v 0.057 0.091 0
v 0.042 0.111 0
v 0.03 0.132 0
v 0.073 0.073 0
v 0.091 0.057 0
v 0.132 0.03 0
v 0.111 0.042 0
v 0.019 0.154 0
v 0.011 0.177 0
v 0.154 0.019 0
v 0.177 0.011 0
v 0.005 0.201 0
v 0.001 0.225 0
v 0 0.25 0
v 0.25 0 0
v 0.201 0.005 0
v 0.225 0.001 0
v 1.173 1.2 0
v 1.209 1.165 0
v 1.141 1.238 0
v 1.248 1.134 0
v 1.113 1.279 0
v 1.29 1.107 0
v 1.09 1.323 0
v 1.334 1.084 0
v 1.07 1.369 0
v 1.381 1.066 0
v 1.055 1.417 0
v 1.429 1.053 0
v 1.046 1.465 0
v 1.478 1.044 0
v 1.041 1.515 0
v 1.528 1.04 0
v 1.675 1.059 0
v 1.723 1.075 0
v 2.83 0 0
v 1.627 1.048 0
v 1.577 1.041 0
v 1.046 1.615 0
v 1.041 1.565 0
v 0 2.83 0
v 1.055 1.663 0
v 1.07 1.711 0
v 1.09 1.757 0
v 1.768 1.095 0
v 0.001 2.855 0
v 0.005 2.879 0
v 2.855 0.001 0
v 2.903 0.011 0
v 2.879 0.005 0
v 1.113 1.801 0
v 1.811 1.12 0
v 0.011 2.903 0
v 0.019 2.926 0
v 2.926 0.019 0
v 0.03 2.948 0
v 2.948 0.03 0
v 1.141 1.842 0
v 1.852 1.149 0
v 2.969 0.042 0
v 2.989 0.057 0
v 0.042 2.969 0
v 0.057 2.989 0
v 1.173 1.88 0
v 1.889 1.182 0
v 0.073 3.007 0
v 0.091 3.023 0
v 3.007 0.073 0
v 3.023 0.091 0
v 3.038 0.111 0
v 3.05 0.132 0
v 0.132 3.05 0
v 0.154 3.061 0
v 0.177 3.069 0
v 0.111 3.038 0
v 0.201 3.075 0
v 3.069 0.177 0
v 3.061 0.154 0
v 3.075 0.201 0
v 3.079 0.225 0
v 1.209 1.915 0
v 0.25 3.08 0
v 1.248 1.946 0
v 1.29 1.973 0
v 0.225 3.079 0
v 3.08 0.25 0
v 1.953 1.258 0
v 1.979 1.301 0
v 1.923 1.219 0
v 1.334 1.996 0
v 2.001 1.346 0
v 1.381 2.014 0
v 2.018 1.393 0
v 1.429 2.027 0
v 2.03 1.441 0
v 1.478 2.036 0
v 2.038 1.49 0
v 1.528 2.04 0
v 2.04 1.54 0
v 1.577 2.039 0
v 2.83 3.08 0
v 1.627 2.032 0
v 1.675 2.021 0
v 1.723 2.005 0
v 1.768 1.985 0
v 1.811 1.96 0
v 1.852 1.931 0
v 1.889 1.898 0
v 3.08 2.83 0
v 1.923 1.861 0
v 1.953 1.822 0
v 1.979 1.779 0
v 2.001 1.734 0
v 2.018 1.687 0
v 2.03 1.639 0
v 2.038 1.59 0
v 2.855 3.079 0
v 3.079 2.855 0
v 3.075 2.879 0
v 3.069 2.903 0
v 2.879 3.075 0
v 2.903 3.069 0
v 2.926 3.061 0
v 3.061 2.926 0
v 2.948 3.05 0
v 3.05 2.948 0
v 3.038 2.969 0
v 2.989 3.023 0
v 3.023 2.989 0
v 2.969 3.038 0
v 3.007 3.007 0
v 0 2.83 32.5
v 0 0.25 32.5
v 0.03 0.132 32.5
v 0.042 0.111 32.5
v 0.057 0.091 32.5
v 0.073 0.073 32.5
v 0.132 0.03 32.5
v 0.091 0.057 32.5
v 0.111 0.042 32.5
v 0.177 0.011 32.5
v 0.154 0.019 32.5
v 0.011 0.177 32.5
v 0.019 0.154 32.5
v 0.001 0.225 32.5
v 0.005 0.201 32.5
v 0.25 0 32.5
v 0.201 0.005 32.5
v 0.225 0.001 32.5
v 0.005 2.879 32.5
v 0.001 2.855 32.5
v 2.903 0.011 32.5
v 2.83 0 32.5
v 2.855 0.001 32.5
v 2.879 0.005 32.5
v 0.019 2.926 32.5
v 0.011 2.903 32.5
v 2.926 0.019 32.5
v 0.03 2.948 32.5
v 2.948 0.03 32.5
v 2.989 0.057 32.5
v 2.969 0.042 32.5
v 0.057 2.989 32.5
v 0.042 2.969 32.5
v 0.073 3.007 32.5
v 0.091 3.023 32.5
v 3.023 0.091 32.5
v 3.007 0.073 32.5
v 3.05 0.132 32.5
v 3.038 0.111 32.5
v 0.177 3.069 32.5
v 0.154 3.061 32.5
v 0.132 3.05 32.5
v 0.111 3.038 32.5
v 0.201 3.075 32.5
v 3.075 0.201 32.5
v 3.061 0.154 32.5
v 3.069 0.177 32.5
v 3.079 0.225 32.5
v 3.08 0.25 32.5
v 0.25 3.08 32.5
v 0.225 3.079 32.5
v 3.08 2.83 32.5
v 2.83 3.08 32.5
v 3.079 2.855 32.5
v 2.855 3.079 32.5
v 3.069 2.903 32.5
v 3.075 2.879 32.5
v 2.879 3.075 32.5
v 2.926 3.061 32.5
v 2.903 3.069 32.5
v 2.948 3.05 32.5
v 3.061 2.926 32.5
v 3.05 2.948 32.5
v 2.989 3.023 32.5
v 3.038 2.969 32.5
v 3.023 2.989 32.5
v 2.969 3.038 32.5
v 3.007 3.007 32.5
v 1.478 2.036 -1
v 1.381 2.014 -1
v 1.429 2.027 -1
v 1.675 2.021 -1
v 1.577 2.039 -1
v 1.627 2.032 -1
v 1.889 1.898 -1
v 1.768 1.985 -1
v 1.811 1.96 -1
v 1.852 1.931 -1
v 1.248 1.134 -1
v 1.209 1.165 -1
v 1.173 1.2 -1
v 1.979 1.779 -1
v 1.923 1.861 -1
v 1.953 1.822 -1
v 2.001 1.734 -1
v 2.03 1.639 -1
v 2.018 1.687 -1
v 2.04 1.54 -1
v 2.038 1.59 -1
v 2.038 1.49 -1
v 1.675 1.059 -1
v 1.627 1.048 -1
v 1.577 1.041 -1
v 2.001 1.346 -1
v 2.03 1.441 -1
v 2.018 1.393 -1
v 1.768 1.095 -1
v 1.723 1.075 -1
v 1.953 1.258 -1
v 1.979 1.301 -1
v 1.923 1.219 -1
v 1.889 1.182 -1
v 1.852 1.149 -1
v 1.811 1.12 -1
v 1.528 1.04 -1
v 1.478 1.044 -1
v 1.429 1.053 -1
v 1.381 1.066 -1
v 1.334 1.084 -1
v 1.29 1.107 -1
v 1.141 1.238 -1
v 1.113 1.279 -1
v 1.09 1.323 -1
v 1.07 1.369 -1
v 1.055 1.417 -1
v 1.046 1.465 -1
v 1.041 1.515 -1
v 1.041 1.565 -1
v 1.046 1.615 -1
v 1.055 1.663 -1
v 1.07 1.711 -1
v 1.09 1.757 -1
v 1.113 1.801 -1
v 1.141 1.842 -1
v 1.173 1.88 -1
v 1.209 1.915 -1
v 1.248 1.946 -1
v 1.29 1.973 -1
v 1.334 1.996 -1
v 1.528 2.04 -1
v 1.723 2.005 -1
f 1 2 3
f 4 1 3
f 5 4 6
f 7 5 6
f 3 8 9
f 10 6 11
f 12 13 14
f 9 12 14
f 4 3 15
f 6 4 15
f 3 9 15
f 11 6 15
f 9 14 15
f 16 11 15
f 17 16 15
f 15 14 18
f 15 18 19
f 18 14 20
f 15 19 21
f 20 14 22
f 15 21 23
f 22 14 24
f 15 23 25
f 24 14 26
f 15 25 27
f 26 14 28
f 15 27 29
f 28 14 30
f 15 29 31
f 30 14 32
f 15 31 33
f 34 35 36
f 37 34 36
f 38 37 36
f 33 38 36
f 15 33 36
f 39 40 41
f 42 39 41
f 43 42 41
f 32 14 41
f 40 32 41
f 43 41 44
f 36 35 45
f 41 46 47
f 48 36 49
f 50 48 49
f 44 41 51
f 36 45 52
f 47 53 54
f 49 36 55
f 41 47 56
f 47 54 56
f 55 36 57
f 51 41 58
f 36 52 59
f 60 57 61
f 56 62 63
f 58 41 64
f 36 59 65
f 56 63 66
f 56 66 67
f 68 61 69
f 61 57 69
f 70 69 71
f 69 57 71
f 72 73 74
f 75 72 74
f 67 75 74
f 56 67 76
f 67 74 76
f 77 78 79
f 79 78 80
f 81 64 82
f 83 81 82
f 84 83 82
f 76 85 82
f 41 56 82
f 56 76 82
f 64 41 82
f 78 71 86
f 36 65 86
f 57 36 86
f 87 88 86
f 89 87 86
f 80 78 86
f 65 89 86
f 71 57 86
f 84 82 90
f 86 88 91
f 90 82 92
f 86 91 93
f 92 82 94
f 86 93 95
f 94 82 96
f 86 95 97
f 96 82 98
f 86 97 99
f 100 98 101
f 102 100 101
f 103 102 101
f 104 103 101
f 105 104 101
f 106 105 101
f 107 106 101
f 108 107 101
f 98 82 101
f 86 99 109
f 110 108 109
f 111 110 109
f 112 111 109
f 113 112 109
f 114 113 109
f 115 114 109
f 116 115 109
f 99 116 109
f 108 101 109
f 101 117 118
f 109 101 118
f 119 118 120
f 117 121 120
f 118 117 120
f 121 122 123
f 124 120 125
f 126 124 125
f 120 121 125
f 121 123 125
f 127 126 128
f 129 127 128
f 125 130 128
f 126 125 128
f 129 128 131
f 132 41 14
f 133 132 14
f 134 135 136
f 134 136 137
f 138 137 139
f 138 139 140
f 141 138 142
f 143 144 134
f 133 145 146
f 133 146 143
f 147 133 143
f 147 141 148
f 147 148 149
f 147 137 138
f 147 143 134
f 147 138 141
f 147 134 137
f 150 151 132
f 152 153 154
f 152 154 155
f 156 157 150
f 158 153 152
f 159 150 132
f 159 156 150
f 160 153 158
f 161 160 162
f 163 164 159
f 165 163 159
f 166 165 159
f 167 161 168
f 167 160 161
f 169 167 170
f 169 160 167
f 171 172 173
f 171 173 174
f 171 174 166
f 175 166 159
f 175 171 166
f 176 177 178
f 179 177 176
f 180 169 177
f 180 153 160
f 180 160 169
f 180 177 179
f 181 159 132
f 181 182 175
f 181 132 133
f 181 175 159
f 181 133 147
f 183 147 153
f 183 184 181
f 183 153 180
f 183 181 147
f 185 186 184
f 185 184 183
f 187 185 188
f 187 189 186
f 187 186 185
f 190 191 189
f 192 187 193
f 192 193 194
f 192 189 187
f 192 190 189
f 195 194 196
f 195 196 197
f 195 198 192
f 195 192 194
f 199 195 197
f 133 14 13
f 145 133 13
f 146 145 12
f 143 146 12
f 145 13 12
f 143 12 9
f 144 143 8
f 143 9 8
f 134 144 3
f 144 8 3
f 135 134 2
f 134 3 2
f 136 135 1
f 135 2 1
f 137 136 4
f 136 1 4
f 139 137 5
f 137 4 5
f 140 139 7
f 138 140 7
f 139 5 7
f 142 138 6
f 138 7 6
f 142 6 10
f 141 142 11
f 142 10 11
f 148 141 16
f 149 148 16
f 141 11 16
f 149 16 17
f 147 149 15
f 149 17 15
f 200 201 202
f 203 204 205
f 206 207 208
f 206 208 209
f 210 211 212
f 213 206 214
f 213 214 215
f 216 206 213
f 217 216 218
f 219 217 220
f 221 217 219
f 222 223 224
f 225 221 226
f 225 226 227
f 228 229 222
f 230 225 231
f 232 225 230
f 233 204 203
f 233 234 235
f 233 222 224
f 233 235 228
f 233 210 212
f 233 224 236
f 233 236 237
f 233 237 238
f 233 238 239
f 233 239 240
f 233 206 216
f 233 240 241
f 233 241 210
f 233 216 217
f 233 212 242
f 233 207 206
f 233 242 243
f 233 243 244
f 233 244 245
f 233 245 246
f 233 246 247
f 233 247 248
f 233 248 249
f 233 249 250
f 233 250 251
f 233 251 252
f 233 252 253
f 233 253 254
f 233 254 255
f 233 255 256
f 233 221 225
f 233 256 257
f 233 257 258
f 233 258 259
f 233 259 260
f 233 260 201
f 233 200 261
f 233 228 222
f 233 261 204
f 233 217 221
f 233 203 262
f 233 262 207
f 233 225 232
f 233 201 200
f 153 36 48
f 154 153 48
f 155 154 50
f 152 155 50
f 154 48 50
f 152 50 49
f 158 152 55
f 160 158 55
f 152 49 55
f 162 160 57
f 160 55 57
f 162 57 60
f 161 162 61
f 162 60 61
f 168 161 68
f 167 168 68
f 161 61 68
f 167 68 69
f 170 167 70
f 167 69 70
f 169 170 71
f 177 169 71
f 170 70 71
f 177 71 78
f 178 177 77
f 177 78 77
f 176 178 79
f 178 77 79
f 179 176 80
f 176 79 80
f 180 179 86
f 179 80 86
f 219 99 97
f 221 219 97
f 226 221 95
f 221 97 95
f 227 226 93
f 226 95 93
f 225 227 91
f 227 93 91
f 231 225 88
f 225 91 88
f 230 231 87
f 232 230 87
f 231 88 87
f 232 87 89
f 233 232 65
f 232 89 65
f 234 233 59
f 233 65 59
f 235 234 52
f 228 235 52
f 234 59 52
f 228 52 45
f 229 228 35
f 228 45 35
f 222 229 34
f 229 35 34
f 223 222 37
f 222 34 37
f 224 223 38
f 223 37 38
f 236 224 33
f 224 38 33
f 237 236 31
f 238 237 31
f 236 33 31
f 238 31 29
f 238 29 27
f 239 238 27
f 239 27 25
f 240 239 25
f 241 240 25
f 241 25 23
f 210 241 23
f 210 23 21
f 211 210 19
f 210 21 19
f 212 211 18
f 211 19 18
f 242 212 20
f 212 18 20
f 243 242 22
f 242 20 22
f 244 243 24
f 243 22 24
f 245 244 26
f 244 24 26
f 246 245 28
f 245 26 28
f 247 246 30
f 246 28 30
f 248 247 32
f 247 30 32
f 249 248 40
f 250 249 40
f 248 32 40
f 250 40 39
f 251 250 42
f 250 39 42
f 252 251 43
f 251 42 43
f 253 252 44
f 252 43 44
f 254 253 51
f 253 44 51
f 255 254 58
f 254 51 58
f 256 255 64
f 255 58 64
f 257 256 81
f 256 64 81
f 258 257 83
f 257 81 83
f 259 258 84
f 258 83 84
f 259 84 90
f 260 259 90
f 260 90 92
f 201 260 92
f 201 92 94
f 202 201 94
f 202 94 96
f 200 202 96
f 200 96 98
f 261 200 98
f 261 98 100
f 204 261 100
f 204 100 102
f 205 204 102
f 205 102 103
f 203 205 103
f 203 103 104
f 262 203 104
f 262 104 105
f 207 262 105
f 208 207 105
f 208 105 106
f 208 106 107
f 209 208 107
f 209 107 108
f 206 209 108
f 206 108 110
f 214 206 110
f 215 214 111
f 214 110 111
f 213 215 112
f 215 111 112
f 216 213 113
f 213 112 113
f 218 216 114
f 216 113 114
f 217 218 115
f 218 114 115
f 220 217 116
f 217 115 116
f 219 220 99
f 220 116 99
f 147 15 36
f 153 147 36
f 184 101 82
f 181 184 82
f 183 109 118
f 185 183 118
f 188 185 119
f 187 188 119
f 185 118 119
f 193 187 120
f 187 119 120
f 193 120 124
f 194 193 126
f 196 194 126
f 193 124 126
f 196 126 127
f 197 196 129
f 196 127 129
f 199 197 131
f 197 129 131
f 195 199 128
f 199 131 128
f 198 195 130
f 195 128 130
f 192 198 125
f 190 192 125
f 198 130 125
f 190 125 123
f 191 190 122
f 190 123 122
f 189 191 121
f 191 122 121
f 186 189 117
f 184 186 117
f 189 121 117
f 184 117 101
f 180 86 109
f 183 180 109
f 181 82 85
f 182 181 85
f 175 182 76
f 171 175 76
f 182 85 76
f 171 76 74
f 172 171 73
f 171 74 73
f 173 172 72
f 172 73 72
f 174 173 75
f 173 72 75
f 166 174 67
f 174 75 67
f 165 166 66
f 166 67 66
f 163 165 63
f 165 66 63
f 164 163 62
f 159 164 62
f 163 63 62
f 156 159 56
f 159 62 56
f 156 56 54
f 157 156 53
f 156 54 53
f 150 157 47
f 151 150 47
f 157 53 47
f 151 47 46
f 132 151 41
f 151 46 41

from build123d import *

# Parameters (mm, degrees)
BOSS_EXTRUDE1_DEPTH = 32.5
SKETCH4_R           = 0.5
BOSS_EXTRUDE2_DEPTH = 1


with BuildPart() as part:
    # Sketch2 → Boss-Extrude1 (new body)
    with BuildSketch(Plane.XY):
        with BuildLine():
            Line((0.25, 0), (2.83, 0))
            ThreePointArc((2.83, 0), (3.006776695, 0.073223305), (3.08, 0.25))
            Line((3.08, 0.25), (3.08, 2.83))
            ThreePointArc((3.08, 2.83), (3.006776695, 3.006776695), (2.83, 3.08))
            Line((2.83, 3.08), (0.25, 3.08))
            ThreePointArc((0.25, 3.08), (0.073223305, 3.006776695), (0, 2.83))
            Line((0, 2.83), (0, 0.25))
            ThreePointArc((0, 0.25), (0.073223305, 0.073223305), (0.25, 0))
        make_face()
    extrude(amount=BOSS_EXTRUDE1_DEPTH)

    # Sketch4 → Boss-Extrude2 (add)
    with BuildSketch(Plane(origin=(0, 0, 0), x_dir=(-1, 0, 0), z_dir=(0, 0, -1))):
        with Locations(Location((-1.54, 1.54, 0), (0, 0, 180))):
            Circle(SKETCH4_R)
    extrude(amount=BOSS_EXTRUDE2_DEPTH)


solid = part.part
